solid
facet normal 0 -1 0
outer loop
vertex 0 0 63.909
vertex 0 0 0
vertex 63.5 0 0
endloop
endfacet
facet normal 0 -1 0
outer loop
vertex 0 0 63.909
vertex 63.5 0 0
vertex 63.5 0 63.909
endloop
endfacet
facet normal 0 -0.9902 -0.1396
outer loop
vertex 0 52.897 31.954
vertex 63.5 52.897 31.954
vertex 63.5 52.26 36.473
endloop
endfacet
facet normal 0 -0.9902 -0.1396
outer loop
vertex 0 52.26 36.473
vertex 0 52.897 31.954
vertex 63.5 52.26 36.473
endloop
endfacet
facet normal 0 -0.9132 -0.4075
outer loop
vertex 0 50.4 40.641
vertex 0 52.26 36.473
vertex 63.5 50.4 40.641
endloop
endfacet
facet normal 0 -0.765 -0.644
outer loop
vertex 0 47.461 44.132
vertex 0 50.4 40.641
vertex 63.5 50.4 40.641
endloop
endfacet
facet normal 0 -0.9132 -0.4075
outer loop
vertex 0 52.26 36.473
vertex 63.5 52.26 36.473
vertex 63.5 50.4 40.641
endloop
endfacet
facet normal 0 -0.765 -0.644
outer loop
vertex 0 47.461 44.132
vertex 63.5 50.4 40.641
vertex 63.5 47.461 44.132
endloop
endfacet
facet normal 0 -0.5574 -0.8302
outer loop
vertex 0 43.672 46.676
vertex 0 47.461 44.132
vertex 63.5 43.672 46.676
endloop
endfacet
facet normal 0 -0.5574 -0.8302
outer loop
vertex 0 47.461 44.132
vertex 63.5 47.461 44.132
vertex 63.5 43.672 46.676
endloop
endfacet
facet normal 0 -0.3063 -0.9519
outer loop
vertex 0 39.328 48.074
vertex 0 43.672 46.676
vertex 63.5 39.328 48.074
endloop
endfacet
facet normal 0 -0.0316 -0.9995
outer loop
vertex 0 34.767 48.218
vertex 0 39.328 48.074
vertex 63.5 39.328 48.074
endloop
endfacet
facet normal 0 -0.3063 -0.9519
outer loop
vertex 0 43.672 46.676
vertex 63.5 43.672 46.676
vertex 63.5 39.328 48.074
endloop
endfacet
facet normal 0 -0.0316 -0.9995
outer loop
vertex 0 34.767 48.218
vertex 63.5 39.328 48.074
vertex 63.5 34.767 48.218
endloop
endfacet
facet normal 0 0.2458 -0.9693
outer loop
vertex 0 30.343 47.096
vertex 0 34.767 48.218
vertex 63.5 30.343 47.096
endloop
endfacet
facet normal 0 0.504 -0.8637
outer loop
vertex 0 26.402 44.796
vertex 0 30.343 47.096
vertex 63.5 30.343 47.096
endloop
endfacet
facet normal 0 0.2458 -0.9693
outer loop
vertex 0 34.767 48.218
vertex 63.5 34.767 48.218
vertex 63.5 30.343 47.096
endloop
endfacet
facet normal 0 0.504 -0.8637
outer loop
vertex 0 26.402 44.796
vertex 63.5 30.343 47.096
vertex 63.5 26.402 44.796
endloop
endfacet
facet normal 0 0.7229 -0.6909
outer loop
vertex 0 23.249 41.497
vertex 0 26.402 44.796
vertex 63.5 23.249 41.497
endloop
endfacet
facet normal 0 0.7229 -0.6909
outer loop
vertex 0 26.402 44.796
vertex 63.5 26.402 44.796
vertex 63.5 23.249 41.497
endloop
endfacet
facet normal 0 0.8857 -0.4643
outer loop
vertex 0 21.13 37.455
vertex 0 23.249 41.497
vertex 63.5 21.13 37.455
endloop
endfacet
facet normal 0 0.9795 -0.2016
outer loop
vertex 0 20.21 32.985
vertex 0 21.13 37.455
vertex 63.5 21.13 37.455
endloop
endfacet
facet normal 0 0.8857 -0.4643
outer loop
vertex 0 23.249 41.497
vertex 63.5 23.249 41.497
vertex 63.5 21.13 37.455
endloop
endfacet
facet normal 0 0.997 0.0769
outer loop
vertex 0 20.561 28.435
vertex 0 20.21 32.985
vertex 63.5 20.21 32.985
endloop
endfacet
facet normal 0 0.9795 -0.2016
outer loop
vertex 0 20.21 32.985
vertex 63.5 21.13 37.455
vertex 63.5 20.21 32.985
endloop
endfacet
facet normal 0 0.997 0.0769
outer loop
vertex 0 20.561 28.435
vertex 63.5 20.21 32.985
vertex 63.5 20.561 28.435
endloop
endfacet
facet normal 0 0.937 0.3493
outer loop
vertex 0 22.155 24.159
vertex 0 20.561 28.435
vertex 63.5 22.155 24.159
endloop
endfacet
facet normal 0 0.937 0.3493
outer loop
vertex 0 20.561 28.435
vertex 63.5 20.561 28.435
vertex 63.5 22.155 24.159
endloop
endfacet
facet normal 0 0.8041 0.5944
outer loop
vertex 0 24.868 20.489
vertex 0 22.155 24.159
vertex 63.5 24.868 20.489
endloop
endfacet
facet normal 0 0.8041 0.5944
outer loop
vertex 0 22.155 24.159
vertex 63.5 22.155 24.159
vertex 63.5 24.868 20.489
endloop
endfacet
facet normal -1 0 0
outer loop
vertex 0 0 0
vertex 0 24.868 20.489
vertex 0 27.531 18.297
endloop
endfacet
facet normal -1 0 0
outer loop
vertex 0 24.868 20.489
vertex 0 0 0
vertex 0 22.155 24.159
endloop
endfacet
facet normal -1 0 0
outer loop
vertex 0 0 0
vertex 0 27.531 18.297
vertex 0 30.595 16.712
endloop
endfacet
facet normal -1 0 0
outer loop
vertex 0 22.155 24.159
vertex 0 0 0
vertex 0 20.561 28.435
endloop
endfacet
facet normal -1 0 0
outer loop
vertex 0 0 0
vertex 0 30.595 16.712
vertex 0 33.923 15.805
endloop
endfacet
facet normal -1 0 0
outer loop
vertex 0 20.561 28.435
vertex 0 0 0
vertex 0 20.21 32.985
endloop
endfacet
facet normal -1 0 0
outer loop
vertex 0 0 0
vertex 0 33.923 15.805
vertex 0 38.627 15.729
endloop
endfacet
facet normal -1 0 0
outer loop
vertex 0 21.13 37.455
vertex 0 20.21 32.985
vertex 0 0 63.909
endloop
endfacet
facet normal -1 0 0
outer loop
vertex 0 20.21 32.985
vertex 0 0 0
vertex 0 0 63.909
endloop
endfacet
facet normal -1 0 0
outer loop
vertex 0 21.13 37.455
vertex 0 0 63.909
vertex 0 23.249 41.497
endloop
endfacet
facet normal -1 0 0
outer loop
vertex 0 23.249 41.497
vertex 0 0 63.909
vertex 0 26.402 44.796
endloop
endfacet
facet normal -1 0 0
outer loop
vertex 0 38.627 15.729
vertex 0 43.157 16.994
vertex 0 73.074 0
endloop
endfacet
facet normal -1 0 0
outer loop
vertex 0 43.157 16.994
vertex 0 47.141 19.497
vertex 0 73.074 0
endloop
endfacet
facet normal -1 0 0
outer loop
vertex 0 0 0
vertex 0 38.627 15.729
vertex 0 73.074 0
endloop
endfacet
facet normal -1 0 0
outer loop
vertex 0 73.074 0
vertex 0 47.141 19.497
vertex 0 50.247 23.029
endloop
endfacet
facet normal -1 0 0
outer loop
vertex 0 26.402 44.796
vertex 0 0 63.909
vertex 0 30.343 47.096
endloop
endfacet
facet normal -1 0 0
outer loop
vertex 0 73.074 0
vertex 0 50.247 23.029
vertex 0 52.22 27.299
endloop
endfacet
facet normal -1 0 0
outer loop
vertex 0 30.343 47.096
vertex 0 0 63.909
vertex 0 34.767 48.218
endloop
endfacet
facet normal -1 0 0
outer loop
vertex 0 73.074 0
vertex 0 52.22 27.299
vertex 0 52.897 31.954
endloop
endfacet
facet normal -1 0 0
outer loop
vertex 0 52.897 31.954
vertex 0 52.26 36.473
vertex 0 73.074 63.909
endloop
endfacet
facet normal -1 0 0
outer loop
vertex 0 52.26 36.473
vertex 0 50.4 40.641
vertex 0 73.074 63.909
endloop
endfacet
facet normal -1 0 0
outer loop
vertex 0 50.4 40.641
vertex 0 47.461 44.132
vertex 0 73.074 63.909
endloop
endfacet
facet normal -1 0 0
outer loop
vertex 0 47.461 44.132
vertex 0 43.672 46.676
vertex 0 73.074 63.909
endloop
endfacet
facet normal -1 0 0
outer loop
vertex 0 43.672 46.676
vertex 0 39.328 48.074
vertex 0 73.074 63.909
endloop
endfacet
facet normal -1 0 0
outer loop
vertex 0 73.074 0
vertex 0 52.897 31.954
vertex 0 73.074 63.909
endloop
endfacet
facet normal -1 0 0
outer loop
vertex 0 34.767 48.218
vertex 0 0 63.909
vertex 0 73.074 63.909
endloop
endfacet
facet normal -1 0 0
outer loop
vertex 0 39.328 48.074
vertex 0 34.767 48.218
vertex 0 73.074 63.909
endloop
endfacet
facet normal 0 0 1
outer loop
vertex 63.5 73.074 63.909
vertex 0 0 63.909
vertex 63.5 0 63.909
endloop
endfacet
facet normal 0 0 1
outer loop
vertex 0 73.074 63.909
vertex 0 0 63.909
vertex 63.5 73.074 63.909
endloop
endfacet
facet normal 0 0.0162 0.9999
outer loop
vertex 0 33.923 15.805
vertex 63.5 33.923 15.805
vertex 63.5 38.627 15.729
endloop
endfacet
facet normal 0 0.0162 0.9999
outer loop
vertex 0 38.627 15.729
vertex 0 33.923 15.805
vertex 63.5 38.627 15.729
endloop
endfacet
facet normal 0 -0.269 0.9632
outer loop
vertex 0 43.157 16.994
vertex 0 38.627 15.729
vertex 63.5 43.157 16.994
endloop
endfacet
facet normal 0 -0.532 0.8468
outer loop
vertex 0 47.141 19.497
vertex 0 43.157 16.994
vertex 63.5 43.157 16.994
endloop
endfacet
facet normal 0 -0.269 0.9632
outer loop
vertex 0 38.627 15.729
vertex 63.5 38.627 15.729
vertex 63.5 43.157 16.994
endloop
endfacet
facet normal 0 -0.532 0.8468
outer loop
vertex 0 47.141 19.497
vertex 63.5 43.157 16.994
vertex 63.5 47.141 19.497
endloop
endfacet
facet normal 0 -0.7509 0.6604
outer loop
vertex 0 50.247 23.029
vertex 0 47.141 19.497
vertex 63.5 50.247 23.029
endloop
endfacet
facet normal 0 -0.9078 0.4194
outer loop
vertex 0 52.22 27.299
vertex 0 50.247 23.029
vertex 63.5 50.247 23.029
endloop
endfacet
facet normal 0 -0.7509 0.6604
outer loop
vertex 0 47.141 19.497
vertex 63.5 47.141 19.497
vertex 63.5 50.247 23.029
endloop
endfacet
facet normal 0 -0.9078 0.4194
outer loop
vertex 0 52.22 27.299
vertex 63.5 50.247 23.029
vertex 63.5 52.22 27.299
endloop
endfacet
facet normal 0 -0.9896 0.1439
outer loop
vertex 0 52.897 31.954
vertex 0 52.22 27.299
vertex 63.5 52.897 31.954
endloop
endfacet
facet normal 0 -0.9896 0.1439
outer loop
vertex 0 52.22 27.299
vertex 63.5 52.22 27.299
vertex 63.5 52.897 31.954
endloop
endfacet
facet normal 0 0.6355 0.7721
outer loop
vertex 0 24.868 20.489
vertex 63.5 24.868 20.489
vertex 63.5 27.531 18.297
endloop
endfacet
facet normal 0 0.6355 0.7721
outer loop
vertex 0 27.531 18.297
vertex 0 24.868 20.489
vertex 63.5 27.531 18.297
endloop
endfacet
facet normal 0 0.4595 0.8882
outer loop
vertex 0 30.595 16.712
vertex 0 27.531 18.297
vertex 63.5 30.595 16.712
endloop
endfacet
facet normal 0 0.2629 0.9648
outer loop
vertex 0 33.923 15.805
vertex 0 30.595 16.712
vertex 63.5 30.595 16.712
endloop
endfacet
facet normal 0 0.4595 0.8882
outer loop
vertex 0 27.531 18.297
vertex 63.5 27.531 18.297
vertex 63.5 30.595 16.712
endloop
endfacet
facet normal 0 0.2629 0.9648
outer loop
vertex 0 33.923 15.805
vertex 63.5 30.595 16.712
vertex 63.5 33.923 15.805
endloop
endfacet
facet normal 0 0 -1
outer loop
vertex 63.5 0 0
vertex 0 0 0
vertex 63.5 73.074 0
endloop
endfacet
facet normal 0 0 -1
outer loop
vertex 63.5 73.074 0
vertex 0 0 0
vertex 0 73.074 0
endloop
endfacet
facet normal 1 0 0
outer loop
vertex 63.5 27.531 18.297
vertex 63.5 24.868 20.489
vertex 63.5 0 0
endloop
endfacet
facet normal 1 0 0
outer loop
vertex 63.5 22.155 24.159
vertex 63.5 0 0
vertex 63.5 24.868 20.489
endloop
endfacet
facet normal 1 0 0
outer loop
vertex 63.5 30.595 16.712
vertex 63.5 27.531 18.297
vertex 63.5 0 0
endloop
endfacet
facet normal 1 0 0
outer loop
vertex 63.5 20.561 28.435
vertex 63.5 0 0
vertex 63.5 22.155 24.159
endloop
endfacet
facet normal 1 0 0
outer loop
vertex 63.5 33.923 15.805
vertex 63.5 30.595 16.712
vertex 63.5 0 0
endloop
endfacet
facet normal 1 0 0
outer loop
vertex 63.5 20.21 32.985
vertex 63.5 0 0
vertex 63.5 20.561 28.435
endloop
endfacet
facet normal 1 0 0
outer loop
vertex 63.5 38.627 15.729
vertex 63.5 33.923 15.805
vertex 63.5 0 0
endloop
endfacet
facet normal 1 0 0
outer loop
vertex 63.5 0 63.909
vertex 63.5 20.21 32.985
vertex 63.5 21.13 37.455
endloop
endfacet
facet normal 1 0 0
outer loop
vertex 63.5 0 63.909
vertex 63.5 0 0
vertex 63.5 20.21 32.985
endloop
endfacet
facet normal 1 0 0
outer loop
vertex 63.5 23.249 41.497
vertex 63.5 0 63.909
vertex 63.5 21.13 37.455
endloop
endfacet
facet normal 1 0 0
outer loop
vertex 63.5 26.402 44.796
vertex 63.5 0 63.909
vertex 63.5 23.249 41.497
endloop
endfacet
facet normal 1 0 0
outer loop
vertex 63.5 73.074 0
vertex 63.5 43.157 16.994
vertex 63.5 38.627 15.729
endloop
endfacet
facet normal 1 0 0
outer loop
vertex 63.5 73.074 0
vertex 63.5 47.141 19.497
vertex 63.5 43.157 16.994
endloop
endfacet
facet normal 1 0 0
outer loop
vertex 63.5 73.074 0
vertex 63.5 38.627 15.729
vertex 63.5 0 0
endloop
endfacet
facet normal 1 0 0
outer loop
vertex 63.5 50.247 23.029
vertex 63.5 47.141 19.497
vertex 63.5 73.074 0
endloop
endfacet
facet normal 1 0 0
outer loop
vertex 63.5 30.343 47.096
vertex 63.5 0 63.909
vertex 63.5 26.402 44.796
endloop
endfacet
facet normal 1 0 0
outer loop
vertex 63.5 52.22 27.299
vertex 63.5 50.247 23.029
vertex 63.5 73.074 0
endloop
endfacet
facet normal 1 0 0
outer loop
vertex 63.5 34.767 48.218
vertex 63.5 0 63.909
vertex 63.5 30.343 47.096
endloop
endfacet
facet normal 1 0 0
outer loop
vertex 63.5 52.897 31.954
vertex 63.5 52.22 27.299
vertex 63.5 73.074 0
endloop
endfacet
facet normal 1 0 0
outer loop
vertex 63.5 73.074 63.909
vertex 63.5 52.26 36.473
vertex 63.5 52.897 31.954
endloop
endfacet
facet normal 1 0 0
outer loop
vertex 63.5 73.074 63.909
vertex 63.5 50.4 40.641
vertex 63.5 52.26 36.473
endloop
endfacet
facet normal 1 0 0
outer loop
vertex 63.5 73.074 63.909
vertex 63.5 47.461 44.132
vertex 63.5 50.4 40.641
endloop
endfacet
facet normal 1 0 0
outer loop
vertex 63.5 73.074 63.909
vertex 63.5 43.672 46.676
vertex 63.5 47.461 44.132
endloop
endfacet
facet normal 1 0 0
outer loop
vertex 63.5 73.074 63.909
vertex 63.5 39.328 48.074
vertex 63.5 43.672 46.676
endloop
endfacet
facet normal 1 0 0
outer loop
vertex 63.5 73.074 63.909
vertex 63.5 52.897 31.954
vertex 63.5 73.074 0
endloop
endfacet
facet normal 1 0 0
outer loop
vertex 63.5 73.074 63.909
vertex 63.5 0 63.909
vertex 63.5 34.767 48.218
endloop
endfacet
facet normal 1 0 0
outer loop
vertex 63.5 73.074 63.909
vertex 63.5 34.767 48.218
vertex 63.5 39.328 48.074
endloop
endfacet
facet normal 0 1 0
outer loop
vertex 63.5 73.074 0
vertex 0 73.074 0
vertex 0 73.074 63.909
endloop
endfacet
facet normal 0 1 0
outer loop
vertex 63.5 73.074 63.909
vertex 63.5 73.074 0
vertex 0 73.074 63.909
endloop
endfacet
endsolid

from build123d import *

# Parameters (mm, degrees)
F0_W     = 73.074155
F0_H     = 63.90892
F1_DEPTH = 63.5
F3_DEPTH = 63.5


with BuildPart() as f1:
    # F0 (on Right) → F1 (new body)
    with BuildSketch(Plane.YZ):
        with Locations((36.537077, 31.95446)):
            Rectangle(F0_W, F0_H)
    extrude(amount=F1_DEPTH)

    # F2 (on face) → F3 (cut)
    with BuildSketch(Plane.YZ.offset(63.5)):
        with BuildLine():
            ThreePointArc((24.867562, 20.489157), (29.021198, 17.423723), (33.923234, 15.8052))
            ThreePointArc((33.923234, 15.8052), (30.073151, 19.457503), (24.867562, 20.489157))
        make_face()
        with BuildLine():
            ThreePointArc((24.867562, 20.489157), (30.073151, 19.457503), (33.923234, 15.8052))
            ThreePointArc((33.923234, 15.8052), (47.14061, 19.496697), (52.896502, 31.95446))
            ThreePointArc((52.896502, 31.95446), (30.343362, 47.09608), (24.867562, 20.489157))
        make_face()
    extrude(amount=-F3_DEPTH, mode=Mode.SUBTRACT)


solid = f1.part
